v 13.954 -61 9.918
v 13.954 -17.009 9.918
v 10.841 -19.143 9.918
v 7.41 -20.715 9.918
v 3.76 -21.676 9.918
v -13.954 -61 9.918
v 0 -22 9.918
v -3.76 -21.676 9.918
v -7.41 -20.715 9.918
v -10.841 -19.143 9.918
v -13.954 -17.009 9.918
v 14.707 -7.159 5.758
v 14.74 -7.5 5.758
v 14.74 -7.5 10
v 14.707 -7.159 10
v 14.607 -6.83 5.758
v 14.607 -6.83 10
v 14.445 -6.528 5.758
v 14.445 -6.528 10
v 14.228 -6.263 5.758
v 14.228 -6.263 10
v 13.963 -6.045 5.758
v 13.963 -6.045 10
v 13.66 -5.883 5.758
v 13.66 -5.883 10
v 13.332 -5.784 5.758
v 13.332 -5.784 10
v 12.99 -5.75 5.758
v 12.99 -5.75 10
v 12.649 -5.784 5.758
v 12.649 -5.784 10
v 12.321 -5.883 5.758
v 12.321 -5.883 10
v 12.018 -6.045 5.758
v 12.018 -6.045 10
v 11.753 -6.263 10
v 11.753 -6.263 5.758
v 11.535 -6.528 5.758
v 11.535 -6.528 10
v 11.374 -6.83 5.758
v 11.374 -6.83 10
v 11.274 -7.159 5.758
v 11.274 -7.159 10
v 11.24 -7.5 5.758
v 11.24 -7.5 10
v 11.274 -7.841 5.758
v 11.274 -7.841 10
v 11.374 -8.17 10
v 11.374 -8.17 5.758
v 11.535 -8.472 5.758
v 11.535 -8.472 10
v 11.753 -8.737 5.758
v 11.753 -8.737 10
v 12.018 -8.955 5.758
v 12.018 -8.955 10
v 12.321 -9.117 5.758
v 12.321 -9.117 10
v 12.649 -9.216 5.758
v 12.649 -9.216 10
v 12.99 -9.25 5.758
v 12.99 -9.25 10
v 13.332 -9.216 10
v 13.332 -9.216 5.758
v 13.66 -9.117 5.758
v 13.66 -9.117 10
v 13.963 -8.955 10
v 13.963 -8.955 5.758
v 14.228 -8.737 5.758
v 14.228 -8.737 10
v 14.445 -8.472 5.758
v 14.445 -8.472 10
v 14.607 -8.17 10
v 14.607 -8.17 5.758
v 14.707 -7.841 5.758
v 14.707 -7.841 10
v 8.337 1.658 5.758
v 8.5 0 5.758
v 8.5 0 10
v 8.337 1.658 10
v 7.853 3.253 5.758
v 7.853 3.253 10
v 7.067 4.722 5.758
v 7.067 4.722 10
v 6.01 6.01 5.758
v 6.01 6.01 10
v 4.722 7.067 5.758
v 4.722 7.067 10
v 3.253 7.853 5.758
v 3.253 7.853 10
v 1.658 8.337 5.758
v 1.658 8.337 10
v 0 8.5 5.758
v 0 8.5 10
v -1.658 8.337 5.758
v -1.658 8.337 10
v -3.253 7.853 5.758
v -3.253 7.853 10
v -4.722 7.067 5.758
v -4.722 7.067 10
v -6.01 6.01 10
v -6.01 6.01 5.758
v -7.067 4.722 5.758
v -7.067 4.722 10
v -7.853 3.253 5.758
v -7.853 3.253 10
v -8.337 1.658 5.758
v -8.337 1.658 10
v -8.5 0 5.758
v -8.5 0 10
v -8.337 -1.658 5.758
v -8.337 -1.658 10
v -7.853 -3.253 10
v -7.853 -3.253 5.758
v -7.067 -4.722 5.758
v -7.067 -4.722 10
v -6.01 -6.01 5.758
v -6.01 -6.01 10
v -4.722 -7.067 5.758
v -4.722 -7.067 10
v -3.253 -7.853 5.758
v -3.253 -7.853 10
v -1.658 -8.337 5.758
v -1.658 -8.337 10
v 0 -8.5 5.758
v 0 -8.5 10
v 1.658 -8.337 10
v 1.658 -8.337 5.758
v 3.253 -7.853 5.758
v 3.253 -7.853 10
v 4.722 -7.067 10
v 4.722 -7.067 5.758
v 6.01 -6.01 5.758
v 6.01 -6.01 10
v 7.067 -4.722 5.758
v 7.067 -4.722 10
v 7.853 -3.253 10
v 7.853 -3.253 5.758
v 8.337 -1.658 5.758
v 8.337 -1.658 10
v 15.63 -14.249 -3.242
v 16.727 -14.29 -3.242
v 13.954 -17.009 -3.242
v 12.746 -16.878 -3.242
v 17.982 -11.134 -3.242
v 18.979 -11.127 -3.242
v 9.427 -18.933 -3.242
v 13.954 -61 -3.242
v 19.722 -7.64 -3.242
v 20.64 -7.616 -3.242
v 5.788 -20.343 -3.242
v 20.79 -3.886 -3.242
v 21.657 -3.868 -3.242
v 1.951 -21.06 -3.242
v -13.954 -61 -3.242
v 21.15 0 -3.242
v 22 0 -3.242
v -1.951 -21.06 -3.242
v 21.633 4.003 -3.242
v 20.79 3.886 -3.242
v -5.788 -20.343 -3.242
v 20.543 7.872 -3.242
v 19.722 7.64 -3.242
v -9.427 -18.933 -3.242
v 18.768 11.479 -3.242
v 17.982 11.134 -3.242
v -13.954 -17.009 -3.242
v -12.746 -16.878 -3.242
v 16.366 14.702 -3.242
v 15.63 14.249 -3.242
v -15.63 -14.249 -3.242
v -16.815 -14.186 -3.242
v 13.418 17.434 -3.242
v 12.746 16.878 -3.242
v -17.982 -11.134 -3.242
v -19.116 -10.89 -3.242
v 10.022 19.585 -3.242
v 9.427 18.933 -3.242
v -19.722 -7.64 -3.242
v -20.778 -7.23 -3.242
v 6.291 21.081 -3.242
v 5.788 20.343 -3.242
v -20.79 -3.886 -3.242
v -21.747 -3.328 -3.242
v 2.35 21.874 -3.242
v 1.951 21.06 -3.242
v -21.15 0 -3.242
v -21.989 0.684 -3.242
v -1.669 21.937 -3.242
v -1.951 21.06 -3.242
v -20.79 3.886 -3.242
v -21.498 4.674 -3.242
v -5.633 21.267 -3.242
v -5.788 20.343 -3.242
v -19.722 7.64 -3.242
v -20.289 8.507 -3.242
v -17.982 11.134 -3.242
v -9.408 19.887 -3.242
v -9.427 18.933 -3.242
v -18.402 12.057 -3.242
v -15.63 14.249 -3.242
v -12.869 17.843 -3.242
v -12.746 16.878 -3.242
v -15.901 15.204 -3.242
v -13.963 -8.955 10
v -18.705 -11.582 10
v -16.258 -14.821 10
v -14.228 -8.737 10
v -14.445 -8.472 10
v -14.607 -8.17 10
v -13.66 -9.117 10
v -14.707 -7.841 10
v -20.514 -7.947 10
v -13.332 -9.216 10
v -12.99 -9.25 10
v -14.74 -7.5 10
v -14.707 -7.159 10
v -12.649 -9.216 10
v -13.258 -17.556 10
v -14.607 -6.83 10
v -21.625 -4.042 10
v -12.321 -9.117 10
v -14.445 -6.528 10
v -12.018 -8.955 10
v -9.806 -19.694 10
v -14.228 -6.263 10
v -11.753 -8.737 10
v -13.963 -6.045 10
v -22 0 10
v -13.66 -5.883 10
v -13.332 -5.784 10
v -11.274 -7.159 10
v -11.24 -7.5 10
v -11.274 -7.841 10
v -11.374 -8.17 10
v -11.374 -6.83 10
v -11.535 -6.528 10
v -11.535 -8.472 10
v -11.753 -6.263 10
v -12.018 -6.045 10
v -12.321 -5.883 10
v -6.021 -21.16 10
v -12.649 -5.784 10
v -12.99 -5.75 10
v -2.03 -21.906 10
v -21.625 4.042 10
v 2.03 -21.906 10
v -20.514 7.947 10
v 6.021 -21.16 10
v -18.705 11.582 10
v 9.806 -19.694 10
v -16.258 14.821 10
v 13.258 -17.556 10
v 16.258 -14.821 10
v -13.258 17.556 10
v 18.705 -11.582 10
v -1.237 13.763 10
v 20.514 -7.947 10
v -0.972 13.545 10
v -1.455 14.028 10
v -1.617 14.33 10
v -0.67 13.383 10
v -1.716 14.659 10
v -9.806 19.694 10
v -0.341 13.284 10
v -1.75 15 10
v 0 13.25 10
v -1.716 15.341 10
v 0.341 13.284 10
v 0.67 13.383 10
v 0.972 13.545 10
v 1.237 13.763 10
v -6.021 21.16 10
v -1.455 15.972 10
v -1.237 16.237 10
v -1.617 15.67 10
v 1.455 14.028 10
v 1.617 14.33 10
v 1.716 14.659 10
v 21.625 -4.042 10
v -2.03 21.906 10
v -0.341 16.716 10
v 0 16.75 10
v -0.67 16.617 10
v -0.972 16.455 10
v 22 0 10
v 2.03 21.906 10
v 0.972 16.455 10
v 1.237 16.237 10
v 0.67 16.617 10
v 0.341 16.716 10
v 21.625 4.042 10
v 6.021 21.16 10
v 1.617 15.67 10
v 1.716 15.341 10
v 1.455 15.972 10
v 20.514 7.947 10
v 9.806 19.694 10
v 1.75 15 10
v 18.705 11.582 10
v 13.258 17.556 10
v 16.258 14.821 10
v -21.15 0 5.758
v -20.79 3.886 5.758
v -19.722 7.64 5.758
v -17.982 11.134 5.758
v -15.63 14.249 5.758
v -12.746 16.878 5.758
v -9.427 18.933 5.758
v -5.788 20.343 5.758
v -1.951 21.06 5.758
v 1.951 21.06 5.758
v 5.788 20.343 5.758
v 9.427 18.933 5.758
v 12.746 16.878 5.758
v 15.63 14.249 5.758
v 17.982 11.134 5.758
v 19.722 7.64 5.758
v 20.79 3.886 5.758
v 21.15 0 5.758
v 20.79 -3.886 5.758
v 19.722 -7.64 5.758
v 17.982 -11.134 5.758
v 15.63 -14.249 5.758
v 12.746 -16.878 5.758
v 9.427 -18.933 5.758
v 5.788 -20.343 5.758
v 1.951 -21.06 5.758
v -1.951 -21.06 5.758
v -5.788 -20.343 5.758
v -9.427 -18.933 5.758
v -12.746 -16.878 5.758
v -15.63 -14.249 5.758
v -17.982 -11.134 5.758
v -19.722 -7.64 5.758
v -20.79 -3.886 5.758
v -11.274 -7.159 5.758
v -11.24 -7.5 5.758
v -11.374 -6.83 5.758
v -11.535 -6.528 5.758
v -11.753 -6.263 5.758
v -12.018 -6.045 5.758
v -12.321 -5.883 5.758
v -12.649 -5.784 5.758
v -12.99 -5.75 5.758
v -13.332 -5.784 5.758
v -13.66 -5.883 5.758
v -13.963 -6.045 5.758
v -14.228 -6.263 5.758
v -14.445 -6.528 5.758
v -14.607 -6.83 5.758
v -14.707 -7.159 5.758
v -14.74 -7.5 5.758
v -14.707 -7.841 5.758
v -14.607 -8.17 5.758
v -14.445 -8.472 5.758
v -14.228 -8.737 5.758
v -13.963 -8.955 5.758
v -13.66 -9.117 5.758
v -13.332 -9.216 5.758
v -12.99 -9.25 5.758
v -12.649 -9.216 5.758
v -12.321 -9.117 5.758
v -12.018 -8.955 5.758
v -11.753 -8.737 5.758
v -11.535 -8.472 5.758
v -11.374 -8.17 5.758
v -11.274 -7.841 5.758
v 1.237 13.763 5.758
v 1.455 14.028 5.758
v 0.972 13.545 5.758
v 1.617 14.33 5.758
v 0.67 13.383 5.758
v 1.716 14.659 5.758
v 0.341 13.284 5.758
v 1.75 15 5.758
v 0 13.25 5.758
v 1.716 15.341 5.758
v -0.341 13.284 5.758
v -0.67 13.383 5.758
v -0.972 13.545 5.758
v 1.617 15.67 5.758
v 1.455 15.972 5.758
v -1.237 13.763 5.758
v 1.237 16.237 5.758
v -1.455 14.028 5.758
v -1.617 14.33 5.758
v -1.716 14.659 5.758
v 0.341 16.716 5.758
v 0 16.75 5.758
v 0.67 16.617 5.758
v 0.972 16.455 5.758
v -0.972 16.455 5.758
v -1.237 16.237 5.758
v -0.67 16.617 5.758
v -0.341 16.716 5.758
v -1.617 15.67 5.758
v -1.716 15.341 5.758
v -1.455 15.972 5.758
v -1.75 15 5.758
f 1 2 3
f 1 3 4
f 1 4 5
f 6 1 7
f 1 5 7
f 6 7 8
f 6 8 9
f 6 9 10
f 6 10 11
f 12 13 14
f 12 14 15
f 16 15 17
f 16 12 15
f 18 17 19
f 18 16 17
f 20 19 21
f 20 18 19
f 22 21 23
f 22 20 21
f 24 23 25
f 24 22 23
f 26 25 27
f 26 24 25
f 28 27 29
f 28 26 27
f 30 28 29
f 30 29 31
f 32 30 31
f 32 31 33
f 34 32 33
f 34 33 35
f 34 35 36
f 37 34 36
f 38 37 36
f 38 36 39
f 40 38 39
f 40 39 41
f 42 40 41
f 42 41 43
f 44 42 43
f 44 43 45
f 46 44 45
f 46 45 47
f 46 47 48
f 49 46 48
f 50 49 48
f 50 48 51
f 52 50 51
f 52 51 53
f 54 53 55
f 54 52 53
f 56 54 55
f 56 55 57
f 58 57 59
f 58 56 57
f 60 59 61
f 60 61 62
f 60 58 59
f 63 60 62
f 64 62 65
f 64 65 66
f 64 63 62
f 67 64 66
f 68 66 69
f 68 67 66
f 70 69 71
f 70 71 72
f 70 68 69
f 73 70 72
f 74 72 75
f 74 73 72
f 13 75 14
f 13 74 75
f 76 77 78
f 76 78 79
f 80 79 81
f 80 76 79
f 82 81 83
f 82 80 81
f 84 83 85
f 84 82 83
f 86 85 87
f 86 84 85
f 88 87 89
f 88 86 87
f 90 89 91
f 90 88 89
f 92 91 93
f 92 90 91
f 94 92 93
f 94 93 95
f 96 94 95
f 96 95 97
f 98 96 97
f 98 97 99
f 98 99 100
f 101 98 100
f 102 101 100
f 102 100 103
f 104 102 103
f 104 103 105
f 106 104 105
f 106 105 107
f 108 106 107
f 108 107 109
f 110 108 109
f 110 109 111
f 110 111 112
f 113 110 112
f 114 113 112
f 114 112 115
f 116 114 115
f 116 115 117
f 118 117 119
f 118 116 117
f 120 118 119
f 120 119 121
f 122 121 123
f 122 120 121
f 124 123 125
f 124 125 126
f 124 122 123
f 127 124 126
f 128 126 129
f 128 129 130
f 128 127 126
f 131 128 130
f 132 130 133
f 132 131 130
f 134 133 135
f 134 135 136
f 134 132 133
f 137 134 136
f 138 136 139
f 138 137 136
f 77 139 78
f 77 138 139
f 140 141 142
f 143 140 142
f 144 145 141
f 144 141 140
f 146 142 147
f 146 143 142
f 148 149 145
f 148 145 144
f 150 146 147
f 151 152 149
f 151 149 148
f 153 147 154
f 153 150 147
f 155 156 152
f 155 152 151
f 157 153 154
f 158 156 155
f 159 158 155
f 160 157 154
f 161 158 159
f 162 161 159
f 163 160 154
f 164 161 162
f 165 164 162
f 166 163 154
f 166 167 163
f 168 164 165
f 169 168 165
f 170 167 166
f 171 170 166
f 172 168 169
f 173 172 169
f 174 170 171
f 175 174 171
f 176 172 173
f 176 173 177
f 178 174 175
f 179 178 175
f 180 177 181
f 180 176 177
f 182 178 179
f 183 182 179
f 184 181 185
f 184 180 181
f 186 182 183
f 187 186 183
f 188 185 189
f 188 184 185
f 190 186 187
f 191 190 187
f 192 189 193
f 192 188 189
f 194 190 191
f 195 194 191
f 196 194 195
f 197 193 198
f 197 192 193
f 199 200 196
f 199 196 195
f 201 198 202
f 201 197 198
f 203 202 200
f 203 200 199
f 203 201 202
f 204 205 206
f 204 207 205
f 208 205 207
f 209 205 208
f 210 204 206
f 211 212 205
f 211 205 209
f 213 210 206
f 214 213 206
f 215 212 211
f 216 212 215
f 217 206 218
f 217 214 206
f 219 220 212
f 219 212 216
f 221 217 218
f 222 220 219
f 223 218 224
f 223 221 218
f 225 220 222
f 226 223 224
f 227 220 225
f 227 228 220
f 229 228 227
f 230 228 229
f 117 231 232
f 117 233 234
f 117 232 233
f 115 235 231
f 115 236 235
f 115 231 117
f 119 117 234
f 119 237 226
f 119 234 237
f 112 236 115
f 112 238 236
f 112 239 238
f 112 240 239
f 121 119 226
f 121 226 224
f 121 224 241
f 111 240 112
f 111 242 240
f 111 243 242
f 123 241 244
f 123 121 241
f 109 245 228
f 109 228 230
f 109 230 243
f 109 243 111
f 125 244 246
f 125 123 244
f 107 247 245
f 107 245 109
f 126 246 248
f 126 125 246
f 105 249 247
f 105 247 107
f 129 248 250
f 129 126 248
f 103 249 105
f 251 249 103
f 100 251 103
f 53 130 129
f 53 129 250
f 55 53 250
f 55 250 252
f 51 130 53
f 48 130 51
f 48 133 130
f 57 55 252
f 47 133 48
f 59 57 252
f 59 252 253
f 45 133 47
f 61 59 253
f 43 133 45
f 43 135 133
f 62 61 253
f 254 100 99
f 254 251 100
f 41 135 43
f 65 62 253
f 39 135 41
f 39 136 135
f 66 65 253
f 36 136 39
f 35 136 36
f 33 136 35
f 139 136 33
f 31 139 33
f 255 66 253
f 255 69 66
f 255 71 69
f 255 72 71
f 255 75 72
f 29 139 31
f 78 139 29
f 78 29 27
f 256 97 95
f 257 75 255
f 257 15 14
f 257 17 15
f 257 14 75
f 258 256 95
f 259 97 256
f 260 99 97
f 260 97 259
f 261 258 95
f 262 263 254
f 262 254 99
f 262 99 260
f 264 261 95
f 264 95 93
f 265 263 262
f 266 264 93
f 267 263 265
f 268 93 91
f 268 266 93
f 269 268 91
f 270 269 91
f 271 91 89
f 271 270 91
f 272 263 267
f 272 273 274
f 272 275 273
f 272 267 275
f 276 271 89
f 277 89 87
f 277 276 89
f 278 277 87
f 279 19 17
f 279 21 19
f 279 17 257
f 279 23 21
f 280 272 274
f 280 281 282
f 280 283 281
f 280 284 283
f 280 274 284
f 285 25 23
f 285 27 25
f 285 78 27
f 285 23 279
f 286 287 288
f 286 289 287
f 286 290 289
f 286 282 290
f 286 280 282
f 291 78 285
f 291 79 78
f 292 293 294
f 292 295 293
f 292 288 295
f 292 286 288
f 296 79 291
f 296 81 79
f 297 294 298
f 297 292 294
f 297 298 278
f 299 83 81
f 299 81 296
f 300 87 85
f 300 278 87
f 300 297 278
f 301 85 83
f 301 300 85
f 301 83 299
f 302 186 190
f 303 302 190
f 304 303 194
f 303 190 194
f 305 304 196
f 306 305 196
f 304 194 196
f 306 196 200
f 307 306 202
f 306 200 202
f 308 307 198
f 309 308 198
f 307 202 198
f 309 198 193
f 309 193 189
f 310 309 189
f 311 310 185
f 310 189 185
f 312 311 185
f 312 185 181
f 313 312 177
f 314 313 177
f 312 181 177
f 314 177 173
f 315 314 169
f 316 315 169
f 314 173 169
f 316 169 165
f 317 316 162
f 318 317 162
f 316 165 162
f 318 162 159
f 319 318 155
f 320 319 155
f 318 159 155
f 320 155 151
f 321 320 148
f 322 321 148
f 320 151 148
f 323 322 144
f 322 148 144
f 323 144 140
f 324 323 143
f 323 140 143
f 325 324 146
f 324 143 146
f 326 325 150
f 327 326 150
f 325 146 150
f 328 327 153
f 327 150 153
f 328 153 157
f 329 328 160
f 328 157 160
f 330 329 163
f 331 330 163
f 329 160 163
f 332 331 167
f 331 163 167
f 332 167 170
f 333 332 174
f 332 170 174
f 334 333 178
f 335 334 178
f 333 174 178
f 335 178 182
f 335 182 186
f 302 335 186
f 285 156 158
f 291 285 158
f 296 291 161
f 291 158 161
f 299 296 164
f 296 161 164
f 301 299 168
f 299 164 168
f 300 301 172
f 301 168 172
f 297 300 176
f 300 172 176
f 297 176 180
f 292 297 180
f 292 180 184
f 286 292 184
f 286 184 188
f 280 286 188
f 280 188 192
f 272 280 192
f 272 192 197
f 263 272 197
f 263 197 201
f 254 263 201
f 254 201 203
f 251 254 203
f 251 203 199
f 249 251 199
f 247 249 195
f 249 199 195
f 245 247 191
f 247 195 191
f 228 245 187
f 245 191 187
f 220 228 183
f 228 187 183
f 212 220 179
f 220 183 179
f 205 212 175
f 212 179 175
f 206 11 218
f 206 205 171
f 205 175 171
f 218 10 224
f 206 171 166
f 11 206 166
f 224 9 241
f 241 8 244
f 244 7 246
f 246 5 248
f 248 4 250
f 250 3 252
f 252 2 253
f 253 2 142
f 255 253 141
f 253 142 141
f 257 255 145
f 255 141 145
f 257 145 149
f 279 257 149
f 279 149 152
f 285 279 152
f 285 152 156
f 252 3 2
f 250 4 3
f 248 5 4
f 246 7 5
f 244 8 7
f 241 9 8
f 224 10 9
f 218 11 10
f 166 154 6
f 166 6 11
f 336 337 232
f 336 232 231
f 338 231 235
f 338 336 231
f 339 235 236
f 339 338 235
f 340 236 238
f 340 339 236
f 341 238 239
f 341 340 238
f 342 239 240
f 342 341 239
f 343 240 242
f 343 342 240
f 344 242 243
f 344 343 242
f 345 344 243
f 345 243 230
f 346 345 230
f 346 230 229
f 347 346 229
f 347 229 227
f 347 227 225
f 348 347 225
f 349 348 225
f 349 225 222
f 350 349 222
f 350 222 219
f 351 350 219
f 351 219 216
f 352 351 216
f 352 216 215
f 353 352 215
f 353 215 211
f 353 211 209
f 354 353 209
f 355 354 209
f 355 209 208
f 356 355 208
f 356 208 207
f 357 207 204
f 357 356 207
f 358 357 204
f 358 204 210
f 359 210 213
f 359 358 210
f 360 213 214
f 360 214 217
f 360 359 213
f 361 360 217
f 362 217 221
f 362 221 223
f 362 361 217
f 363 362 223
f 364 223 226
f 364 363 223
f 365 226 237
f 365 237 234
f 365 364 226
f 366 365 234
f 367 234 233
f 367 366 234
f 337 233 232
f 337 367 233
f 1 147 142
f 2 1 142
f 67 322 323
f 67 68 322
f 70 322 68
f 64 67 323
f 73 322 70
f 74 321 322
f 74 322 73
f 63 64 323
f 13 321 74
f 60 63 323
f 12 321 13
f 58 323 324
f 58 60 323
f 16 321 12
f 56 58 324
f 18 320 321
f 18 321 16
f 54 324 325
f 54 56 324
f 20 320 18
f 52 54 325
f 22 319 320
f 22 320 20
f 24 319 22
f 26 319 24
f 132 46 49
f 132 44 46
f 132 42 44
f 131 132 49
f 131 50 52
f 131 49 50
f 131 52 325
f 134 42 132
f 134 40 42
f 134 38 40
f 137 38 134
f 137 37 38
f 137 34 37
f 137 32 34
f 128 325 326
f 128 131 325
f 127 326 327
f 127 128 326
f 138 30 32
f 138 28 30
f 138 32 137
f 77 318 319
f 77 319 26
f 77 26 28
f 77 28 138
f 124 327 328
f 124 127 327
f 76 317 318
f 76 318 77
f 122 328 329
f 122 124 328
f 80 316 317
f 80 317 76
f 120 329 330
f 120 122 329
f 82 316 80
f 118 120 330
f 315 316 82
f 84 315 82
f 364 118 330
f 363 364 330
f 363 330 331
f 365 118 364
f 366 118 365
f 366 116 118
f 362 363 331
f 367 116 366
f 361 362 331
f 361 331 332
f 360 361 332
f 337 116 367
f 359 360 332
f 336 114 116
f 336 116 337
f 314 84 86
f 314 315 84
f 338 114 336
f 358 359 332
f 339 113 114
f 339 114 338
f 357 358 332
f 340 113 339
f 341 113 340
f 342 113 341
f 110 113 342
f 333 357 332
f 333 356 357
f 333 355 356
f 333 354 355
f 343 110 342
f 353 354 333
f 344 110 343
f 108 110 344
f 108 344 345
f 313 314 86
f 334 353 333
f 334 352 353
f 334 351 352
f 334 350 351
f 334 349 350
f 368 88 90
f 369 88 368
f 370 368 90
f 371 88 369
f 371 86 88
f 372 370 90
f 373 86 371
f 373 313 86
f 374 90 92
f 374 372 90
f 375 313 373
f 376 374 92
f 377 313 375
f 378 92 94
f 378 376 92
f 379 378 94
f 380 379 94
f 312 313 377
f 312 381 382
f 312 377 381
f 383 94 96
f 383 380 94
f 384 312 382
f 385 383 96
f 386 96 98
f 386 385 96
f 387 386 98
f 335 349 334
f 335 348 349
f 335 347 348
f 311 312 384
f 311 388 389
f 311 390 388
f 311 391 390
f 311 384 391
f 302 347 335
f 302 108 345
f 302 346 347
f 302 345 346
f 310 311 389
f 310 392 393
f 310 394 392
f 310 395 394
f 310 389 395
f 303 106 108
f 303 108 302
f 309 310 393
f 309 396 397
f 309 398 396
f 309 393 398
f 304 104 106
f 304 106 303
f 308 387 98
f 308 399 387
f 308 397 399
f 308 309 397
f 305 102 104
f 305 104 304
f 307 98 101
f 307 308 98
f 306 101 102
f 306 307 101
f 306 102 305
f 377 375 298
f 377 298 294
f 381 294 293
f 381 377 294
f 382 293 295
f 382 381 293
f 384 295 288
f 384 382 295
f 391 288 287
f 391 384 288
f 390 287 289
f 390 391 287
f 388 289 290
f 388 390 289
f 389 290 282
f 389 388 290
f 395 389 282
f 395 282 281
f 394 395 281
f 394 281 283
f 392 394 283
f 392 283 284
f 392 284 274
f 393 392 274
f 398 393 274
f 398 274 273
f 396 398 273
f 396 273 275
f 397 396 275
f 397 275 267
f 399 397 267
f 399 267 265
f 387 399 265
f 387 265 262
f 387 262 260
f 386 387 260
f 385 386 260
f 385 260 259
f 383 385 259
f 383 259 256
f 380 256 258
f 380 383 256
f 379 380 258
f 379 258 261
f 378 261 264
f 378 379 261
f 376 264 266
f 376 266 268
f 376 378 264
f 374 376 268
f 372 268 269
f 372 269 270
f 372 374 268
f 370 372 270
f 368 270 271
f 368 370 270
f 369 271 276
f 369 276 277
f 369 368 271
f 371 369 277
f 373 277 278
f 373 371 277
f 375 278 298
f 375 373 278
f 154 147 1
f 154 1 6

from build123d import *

# Parameters (mm, degrees)
BOSS_EXTRUDE1_DEPTH      = 10
BOSS_EXTRUDE1_DEPTH_BACK = 3.242369731
SKETCH1_R                = 22
SKETCH1_R_2              = 1.75
SKETCH1_R_3              = 8.5
SKETCH2_W                = 27.907133148
SKETCH2_H                = 43.991238144
BOSS_EXTRUDE3_DEPTH      = 13.160474469
SKETCH3_R                = 21.15
CUT_EXTRUDE1_DEPTH       = 9


with BuildPart() as part:
    # Sketch1 → Boss-Extrude1 (new, two sides: drawn at the far end of the back side and taken through both)
    with BuildSketch(Plane.XY.offset(-BOSS_EXTRUDE1_DEPTH_BACK)):
        Circle(SKETCH1_R)
        with Locations((0, 15)):
            Circle(SKETCH1_R_2, mode=Mode.SUBTRACT)
        with Locations((12.990381057, -7.5)):
            Circle(SKETCH1_R_2, mode=Mode.SUBTRACT)
        with Locations((-12.990381057, -7.5)):
            Circle(SKETCH1_R_2, mode=Mode.SUBTRACT)
        Circle(SKETCH1_R_3, mode=Mode.SUBTRACT)
    extrude(amount=BOSS_EXTRUDE1_DEPTH + BOSS_EXTRUDE1_DEPTH_BACK)

    # Sketch2 → Boss-Extrude3 (add)
    with BuildSketch(Plane(origin=(0, 0, -3.242369731), x_dir=(-1, 0, 0), z_dir=(0, 0, -1))):
        with Locations((0, -39.004380928)):
            Rectangle(SKETCH2_W, SKETCH2_H)
    extrude(amount=-BOSS_EXTRUDE3_DEPTH)

    # Sketch3 → Cut-Extrude1 (cut)
    with BuildSketch(Plane(origin=(0, 0, -3.242369731), x_dir=(-1, 0, 0), z_dir=(0, 0, -1))):
        Circle(SKETCH3_R)
    extrude(amount=-CUT_EXTRUDE1_DEPTH, mode=Mode.SUBTRACT)


solid = part.part
